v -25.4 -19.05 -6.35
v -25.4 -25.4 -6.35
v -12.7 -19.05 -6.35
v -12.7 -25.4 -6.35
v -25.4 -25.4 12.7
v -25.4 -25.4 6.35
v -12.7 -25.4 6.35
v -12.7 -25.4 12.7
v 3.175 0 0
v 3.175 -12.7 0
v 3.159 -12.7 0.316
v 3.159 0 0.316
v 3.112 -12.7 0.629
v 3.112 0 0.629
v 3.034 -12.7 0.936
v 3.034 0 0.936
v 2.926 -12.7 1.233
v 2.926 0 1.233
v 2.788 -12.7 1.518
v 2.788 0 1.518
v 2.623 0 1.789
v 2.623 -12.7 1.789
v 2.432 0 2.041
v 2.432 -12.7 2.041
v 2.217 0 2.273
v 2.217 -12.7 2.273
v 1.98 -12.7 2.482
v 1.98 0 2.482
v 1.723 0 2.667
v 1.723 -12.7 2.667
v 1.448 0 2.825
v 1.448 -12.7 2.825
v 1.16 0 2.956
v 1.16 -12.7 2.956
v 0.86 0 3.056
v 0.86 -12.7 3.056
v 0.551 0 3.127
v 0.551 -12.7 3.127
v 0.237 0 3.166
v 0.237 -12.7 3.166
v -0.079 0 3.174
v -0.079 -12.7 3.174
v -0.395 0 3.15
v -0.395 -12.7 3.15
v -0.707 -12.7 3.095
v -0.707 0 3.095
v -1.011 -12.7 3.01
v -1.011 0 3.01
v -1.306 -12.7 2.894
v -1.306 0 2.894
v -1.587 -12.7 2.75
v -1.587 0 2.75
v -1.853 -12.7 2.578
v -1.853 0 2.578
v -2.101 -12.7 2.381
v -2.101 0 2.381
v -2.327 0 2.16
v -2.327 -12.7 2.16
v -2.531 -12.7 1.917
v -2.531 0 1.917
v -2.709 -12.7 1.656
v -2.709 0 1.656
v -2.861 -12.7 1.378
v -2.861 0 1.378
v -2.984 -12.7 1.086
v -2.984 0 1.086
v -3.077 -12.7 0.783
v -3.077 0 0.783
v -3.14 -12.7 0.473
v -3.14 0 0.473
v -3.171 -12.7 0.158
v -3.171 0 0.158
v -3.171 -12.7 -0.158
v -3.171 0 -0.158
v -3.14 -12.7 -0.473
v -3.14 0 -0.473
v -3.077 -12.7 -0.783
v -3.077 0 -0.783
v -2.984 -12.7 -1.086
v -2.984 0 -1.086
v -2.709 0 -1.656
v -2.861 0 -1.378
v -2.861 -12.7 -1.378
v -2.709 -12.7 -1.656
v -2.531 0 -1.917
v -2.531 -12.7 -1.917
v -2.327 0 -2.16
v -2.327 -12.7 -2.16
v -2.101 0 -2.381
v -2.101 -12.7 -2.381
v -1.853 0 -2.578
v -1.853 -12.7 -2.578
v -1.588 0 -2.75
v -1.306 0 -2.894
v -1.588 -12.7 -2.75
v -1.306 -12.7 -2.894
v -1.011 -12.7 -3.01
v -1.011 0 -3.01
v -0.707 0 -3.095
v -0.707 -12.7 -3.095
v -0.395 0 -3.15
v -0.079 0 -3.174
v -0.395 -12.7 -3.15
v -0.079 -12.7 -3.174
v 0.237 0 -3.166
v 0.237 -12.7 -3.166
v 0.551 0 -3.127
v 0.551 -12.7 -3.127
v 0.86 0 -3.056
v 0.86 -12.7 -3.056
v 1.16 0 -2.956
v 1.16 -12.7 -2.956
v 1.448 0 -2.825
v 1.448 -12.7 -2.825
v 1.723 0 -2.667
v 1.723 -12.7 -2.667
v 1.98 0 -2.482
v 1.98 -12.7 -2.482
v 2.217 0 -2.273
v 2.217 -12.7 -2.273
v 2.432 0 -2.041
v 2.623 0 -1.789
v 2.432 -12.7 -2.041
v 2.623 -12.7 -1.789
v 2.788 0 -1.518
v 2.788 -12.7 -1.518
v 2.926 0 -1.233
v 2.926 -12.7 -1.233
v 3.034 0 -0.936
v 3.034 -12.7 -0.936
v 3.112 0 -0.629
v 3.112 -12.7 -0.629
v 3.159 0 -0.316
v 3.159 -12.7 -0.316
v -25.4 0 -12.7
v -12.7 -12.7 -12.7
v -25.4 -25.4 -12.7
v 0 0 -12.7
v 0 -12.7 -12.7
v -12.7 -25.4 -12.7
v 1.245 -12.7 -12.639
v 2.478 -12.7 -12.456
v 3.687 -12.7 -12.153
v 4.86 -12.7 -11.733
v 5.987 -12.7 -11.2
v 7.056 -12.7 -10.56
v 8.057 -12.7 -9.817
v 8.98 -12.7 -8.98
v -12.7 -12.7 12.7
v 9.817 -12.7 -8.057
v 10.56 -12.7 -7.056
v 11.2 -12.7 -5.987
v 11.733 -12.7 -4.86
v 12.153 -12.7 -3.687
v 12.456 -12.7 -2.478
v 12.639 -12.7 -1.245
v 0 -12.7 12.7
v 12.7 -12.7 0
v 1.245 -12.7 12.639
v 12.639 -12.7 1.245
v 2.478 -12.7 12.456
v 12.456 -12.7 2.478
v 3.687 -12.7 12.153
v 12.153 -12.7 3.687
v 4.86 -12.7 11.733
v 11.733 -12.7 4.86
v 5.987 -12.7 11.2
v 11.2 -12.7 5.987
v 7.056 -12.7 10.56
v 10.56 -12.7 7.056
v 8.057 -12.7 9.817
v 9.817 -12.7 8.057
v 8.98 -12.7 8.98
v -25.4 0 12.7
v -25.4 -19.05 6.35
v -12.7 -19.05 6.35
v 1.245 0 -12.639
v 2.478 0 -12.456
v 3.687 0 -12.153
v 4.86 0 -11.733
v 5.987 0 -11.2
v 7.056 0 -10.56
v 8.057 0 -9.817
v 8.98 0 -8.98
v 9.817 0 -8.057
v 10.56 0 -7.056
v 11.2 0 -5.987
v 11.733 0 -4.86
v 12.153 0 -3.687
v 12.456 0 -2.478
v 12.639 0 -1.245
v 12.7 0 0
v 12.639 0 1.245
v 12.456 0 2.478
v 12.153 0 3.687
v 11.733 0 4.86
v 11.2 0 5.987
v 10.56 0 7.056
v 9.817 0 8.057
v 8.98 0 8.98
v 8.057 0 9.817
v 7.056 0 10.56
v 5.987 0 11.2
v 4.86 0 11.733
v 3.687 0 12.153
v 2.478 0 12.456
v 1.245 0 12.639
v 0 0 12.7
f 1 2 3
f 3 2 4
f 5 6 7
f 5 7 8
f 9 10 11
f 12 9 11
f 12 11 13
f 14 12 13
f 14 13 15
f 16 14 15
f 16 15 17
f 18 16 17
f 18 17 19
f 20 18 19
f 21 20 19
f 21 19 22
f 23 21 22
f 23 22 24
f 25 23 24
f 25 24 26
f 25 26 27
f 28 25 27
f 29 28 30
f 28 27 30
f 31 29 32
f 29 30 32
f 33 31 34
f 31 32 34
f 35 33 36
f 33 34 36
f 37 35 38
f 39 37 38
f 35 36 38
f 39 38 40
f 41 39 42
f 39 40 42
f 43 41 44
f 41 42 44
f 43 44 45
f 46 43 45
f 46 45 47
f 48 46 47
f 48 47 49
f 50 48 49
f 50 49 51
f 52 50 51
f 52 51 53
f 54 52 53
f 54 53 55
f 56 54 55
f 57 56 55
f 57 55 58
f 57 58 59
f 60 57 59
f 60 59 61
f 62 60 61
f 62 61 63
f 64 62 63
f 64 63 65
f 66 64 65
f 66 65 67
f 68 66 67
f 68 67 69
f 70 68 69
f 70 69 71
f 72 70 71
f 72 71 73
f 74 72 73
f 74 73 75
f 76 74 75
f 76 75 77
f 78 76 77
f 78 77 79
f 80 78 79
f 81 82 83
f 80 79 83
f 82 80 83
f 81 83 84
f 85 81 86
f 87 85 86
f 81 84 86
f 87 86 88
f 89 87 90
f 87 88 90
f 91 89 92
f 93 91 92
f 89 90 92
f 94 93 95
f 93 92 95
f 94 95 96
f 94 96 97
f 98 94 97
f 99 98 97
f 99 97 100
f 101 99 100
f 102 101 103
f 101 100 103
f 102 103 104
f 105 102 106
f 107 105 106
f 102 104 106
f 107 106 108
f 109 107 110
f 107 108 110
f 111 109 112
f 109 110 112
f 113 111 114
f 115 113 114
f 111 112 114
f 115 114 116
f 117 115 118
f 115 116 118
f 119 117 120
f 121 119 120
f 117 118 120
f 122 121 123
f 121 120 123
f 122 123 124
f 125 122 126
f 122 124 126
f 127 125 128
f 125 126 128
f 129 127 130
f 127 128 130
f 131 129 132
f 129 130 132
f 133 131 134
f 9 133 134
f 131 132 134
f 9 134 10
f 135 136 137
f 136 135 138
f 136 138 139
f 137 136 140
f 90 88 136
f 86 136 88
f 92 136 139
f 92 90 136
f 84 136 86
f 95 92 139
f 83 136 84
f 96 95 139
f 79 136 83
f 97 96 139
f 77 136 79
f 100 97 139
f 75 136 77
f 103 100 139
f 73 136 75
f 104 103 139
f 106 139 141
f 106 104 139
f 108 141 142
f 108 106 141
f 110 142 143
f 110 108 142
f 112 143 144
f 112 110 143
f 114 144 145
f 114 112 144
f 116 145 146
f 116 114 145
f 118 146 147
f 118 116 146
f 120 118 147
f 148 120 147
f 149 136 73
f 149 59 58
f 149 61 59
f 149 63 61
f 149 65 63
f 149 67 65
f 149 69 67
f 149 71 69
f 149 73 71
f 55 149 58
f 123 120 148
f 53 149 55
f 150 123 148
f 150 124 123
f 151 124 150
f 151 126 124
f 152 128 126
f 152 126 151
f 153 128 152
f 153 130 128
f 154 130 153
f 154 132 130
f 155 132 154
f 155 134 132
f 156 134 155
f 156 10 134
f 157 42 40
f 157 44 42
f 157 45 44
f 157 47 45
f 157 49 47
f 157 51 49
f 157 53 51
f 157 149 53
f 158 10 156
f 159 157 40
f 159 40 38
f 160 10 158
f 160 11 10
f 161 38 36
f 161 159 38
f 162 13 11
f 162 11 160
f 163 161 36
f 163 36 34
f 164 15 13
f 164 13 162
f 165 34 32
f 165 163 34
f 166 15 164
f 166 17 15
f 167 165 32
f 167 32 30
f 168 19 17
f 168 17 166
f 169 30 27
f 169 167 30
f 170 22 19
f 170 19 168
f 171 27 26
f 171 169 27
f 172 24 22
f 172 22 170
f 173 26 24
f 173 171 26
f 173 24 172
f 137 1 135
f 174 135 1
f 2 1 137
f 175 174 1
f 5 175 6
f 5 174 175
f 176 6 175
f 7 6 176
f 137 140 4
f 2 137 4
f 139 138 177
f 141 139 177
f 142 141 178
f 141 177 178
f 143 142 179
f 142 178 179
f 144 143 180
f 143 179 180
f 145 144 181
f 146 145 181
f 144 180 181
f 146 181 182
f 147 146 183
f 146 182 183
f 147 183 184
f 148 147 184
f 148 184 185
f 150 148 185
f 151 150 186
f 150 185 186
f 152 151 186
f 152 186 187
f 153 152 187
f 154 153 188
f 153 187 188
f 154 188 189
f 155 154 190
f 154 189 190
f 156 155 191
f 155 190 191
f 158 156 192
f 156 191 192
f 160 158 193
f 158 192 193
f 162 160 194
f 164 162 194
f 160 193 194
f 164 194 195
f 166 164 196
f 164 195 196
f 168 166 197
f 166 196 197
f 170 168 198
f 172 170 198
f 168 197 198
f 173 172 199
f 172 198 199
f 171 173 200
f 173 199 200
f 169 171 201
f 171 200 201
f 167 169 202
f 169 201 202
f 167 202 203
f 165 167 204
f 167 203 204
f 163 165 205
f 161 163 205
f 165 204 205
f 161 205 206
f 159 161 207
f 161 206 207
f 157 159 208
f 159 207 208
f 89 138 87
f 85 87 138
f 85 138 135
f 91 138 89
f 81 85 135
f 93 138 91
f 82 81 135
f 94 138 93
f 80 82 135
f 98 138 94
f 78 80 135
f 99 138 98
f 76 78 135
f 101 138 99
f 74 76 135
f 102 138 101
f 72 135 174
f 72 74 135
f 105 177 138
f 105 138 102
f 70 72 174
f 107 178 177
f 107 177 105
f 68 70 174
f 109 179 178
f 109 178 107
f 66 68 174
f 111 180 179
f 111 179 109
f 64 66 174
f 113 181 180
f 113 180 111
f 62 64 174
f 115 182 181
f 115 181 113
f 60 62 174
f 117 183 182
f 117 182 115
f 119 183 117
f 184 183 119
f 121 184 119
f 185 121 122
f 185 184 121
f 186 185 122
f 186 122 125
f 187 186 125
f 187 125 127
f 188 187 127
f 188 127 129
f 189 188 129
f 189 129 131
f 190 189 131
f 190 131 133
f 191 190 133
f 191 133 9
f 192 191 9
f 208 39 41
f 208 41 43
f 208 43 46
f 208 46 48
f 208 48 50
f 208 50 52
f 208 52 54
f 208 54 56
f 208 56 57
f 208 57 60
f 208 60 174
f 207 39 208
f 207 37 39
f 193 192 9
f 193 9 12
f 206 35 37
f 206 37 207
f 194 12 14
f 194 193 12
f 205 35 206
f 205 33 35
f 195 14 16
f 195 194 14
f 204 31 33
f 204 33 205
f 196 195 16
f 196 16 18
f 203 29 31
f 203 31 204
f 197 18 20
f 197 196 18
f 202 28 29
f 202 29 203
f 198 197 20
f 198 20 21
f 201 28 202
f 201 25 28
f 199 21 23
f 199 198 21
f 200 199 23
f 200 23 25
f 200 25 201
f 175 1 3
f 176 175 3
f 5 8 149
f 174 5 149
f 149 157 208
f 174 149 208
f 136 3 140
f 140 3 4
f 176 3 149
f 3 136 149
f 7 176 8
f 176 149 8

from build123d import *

# Parameters (mm, degrees)
F1_DEPTH = 12.7
F2_R     = 3.175
F3_DEPTH = 25.4
F4_W     = 12.7
F4_H     = 25.4
F5_DEPTH = 12.7
F6_W     = 12.7
F6_H     = 12.7
F7_DEPTH = 6.35


with BuildPart() as f1:
    # F0 (on Front) → F1 (new body)
    with BuildSketch(Plane.XZ):
        with BuildLine():
            Line((-12.7, -12.7), (0, -12.7))
            ThreePointArc((0, -12.7), (12.7, 0), (0, 12.7))
            Line((0, 12.7), (-12.7, 12.7))
            Line((-12.7, 12.7), (-12.7, -12.7))
        make_face()
    extrude(amount=F1_DEPTH)

    # F2 (on face) → F3 (cut)
    with BuildSketch(Plane.XZ.offset(12.7)):
        Circle(F2_R)
    extrude(amount=-F3_DEPTH, mode=Mode.SUBTRACT)

    # F4 (on face) → F5 (join)
    with BuildSketch(Plane(origin=(-12.7, 0, 0), x_dir=(0, -1, 0), z_dir=(-1, 0, 0))):
        with Locations((6.35, 0)):
            Rectangle(F4_W, F4_H)
        with Locations((19.05, 0)):
            Rectangle(F4_W, F4_H)
    extrude(amount=F5_DEPTH)

    # F6 (on face) → F7 (cut)
    with BuildSketch(Plane.XZ.offset(25.4)):
        with Locations((-19.05, 0)):
            Rectangle(F6_W, F6_H)
    extrude(amount=-F7_DEPTH, mode=Mode.SUBTRACT)


solid = f1.part
